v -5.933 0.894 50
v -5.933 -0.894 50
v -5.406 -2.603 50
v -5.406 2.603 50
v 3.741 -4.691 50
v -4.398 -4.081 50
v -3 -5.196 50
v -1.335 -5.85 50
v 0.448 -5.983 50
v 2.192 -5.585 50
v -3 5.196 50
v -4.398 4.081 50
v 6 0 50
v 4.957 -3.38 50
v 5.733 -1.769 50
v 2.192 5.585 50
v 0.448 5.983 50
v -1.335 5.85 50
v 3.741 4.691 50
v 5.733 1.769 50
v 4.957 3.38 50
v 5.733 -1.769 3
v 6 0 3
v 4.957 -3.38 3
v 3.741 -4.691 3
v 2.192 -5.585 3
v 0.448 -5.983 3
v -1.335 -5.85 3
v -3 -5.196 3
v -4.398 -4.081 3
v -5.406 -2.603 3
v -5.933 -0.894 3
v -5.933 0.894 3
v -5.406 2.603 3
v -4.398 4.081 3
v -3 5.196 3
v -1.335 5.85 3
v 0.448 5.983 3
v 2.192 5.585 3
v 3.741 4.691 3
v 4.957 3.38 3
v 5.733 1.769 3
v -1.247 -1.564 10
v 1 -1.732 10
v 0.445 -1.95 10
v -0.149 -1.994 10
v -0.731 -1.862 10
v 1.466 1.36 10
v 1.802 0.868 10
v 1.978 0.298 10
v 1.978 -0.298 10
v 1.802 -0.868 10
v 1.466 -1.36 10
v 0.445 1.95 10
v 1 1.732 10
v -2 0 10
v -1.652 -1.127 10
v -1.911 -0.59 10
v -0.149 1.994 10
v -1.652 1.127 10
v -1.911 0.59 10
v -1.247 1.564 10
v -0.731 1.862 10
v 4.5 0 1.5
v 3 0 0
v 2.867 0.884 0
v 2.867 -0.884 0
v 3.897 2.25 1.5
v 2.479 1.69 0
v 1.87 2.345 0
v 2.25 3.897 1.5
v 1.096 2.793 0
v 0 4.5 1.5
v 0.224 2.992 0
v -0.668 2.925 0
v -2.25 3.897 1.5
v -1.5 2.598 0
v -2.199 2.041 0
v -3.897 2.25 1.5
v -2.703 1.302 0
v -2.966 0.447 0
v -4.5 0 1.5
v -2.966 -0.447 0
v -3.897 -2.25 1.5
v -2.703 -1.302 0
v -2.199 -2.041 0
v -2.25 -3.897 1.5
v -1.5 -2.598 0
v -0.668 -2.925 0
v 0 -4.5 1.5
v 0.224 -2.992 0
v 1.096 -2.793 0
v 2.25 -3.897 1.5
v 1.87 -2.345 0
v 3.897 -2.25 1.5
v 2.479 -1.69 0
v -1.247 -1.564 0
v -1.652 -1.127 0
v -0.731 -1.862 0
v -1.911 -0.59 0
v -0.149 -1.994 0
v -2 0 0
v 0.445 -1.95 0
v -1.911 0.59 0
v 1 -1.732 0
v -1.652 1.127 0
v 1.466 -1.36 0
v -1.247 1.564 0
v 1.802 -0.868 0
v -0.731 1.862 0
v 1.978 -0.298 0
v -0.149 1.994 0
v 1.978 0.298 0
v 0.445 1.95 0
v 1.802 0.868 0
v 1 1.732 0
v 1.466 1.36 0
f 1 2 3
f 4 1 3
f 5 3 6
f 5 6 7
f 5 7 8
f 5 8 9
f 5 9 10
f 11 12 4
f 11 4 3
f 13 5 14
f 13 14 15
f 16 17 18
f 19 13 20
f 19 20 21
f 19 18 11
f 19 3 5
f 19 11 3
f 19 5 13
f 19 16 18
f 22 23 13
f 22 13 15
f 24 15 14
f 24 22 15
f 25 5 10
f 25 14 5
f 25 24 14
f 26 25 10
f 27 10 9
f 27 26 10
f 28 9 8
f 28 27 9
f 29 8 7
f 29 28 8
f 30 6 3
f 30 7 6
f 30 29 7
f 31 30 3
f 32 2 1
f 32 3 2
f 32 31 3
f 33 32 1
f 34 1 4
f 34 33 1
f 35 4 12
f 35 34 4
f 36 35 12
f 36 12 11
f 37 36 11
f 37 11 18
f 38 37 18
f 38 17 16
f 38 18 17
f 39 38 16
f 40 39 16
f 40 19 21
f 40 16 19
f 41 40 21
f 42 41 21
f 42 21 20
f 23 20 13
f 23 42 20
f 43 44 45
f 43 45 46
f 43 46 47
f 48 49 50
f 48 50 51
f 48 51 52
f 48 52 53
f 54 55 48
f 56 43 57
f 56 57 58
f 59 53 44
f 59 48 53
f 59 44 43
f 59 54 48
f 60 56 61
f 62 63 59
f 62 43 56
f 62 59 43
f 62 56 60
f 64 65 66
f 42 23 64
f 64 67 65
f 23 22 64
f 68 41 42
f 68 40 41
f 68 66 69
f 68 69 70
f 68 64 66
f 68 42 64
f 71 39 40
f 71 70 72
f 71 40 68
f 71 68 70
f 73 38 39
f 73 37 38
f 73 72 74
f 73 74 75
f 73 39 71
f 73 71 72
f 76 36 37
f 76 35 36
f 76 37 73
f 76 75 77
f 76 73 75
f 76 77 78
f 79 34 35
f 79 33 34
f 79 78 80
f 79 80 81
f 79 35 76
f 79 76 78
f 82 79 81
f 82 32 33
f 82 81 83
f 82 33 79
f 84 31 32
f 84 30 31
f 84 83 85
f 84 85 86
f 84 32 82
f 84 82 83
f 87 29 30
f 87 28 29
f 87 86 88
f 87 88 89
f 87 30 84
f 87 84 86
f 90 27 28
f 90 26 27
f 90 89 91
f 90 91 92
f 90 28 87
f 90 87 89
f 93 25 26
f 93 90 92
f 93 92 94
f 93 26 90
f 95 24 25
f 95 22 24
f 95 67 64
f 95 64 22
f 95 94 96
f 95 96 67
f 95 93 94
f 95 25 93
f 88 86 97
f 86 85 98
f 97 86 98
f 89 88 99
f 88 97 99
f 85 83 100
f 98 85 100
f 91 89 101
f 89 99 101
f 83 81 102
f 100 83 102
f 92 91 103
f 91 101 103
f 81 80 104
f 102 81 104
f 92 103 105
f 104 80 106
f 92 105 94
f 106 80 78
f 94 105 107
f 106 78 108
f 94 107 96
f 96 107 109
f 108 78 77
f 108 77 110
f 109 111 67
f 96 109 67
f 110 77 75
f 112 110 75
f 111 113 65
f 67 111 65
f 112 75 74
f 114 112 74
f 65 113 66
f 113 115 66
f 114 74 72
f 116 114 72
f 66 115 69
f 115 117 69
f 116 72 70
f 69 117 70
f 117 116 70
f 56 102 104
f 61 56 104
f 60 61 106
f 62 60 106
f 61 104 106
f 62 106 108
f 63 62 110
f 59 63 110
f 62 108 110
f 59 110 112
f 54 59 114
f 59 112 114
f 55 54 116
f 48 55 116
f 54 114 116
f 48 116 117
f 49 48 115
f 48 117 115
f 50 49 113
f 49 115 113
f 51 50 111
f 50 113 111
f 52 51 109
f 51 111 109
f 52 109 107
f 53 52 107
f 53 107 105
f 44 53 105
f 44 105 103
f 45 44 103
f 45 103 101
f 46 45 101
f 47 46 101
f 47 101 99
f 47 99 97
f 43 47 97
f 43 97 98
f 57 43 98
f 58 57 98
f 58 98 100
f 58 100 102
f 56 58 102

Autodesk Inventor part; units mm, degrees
ref_plane "YZ Plane" through (0, 0, 0) normal (1, 0, 0) x (0, 1, 0)
ref_plane "XZ Plane" through (0, 0, 0) normal (0, 1, 0) x (-1, 0, 0)
ref_plane "XY Plane" through (0, 0, 0) normal (0, 0, 1) x (1, 0, 0)
sketch "Sketch1" plane through (0, 0, 0) normal (0, 0, 1) x (1, 0, 0)
  circle A0 centre (0, 0) radius 6
  dimension "d0" = 12
extrude "Extrusion1" add sketch "Sketch1" along normal blind 50
sketch "Sketch2" plane through (0, 0, 50) normal (0, 0, 1) x (1, 0, 0)
  point P0 (0, 0)
chamfer "Chamfer1" distance 3 angle 45 1 edges at (-6, 0, 0)
sketch "Sketch4" plane through (0, 0, 0) normal (0, 0, -1) x (-1, 0, 0)
  circle A0 centre (0, 0) radius 2
  dimension "d8" = 4
extrude "Extrusion3" cut sketch "Sketch4" against normal blind 10
properties part number "arm"
